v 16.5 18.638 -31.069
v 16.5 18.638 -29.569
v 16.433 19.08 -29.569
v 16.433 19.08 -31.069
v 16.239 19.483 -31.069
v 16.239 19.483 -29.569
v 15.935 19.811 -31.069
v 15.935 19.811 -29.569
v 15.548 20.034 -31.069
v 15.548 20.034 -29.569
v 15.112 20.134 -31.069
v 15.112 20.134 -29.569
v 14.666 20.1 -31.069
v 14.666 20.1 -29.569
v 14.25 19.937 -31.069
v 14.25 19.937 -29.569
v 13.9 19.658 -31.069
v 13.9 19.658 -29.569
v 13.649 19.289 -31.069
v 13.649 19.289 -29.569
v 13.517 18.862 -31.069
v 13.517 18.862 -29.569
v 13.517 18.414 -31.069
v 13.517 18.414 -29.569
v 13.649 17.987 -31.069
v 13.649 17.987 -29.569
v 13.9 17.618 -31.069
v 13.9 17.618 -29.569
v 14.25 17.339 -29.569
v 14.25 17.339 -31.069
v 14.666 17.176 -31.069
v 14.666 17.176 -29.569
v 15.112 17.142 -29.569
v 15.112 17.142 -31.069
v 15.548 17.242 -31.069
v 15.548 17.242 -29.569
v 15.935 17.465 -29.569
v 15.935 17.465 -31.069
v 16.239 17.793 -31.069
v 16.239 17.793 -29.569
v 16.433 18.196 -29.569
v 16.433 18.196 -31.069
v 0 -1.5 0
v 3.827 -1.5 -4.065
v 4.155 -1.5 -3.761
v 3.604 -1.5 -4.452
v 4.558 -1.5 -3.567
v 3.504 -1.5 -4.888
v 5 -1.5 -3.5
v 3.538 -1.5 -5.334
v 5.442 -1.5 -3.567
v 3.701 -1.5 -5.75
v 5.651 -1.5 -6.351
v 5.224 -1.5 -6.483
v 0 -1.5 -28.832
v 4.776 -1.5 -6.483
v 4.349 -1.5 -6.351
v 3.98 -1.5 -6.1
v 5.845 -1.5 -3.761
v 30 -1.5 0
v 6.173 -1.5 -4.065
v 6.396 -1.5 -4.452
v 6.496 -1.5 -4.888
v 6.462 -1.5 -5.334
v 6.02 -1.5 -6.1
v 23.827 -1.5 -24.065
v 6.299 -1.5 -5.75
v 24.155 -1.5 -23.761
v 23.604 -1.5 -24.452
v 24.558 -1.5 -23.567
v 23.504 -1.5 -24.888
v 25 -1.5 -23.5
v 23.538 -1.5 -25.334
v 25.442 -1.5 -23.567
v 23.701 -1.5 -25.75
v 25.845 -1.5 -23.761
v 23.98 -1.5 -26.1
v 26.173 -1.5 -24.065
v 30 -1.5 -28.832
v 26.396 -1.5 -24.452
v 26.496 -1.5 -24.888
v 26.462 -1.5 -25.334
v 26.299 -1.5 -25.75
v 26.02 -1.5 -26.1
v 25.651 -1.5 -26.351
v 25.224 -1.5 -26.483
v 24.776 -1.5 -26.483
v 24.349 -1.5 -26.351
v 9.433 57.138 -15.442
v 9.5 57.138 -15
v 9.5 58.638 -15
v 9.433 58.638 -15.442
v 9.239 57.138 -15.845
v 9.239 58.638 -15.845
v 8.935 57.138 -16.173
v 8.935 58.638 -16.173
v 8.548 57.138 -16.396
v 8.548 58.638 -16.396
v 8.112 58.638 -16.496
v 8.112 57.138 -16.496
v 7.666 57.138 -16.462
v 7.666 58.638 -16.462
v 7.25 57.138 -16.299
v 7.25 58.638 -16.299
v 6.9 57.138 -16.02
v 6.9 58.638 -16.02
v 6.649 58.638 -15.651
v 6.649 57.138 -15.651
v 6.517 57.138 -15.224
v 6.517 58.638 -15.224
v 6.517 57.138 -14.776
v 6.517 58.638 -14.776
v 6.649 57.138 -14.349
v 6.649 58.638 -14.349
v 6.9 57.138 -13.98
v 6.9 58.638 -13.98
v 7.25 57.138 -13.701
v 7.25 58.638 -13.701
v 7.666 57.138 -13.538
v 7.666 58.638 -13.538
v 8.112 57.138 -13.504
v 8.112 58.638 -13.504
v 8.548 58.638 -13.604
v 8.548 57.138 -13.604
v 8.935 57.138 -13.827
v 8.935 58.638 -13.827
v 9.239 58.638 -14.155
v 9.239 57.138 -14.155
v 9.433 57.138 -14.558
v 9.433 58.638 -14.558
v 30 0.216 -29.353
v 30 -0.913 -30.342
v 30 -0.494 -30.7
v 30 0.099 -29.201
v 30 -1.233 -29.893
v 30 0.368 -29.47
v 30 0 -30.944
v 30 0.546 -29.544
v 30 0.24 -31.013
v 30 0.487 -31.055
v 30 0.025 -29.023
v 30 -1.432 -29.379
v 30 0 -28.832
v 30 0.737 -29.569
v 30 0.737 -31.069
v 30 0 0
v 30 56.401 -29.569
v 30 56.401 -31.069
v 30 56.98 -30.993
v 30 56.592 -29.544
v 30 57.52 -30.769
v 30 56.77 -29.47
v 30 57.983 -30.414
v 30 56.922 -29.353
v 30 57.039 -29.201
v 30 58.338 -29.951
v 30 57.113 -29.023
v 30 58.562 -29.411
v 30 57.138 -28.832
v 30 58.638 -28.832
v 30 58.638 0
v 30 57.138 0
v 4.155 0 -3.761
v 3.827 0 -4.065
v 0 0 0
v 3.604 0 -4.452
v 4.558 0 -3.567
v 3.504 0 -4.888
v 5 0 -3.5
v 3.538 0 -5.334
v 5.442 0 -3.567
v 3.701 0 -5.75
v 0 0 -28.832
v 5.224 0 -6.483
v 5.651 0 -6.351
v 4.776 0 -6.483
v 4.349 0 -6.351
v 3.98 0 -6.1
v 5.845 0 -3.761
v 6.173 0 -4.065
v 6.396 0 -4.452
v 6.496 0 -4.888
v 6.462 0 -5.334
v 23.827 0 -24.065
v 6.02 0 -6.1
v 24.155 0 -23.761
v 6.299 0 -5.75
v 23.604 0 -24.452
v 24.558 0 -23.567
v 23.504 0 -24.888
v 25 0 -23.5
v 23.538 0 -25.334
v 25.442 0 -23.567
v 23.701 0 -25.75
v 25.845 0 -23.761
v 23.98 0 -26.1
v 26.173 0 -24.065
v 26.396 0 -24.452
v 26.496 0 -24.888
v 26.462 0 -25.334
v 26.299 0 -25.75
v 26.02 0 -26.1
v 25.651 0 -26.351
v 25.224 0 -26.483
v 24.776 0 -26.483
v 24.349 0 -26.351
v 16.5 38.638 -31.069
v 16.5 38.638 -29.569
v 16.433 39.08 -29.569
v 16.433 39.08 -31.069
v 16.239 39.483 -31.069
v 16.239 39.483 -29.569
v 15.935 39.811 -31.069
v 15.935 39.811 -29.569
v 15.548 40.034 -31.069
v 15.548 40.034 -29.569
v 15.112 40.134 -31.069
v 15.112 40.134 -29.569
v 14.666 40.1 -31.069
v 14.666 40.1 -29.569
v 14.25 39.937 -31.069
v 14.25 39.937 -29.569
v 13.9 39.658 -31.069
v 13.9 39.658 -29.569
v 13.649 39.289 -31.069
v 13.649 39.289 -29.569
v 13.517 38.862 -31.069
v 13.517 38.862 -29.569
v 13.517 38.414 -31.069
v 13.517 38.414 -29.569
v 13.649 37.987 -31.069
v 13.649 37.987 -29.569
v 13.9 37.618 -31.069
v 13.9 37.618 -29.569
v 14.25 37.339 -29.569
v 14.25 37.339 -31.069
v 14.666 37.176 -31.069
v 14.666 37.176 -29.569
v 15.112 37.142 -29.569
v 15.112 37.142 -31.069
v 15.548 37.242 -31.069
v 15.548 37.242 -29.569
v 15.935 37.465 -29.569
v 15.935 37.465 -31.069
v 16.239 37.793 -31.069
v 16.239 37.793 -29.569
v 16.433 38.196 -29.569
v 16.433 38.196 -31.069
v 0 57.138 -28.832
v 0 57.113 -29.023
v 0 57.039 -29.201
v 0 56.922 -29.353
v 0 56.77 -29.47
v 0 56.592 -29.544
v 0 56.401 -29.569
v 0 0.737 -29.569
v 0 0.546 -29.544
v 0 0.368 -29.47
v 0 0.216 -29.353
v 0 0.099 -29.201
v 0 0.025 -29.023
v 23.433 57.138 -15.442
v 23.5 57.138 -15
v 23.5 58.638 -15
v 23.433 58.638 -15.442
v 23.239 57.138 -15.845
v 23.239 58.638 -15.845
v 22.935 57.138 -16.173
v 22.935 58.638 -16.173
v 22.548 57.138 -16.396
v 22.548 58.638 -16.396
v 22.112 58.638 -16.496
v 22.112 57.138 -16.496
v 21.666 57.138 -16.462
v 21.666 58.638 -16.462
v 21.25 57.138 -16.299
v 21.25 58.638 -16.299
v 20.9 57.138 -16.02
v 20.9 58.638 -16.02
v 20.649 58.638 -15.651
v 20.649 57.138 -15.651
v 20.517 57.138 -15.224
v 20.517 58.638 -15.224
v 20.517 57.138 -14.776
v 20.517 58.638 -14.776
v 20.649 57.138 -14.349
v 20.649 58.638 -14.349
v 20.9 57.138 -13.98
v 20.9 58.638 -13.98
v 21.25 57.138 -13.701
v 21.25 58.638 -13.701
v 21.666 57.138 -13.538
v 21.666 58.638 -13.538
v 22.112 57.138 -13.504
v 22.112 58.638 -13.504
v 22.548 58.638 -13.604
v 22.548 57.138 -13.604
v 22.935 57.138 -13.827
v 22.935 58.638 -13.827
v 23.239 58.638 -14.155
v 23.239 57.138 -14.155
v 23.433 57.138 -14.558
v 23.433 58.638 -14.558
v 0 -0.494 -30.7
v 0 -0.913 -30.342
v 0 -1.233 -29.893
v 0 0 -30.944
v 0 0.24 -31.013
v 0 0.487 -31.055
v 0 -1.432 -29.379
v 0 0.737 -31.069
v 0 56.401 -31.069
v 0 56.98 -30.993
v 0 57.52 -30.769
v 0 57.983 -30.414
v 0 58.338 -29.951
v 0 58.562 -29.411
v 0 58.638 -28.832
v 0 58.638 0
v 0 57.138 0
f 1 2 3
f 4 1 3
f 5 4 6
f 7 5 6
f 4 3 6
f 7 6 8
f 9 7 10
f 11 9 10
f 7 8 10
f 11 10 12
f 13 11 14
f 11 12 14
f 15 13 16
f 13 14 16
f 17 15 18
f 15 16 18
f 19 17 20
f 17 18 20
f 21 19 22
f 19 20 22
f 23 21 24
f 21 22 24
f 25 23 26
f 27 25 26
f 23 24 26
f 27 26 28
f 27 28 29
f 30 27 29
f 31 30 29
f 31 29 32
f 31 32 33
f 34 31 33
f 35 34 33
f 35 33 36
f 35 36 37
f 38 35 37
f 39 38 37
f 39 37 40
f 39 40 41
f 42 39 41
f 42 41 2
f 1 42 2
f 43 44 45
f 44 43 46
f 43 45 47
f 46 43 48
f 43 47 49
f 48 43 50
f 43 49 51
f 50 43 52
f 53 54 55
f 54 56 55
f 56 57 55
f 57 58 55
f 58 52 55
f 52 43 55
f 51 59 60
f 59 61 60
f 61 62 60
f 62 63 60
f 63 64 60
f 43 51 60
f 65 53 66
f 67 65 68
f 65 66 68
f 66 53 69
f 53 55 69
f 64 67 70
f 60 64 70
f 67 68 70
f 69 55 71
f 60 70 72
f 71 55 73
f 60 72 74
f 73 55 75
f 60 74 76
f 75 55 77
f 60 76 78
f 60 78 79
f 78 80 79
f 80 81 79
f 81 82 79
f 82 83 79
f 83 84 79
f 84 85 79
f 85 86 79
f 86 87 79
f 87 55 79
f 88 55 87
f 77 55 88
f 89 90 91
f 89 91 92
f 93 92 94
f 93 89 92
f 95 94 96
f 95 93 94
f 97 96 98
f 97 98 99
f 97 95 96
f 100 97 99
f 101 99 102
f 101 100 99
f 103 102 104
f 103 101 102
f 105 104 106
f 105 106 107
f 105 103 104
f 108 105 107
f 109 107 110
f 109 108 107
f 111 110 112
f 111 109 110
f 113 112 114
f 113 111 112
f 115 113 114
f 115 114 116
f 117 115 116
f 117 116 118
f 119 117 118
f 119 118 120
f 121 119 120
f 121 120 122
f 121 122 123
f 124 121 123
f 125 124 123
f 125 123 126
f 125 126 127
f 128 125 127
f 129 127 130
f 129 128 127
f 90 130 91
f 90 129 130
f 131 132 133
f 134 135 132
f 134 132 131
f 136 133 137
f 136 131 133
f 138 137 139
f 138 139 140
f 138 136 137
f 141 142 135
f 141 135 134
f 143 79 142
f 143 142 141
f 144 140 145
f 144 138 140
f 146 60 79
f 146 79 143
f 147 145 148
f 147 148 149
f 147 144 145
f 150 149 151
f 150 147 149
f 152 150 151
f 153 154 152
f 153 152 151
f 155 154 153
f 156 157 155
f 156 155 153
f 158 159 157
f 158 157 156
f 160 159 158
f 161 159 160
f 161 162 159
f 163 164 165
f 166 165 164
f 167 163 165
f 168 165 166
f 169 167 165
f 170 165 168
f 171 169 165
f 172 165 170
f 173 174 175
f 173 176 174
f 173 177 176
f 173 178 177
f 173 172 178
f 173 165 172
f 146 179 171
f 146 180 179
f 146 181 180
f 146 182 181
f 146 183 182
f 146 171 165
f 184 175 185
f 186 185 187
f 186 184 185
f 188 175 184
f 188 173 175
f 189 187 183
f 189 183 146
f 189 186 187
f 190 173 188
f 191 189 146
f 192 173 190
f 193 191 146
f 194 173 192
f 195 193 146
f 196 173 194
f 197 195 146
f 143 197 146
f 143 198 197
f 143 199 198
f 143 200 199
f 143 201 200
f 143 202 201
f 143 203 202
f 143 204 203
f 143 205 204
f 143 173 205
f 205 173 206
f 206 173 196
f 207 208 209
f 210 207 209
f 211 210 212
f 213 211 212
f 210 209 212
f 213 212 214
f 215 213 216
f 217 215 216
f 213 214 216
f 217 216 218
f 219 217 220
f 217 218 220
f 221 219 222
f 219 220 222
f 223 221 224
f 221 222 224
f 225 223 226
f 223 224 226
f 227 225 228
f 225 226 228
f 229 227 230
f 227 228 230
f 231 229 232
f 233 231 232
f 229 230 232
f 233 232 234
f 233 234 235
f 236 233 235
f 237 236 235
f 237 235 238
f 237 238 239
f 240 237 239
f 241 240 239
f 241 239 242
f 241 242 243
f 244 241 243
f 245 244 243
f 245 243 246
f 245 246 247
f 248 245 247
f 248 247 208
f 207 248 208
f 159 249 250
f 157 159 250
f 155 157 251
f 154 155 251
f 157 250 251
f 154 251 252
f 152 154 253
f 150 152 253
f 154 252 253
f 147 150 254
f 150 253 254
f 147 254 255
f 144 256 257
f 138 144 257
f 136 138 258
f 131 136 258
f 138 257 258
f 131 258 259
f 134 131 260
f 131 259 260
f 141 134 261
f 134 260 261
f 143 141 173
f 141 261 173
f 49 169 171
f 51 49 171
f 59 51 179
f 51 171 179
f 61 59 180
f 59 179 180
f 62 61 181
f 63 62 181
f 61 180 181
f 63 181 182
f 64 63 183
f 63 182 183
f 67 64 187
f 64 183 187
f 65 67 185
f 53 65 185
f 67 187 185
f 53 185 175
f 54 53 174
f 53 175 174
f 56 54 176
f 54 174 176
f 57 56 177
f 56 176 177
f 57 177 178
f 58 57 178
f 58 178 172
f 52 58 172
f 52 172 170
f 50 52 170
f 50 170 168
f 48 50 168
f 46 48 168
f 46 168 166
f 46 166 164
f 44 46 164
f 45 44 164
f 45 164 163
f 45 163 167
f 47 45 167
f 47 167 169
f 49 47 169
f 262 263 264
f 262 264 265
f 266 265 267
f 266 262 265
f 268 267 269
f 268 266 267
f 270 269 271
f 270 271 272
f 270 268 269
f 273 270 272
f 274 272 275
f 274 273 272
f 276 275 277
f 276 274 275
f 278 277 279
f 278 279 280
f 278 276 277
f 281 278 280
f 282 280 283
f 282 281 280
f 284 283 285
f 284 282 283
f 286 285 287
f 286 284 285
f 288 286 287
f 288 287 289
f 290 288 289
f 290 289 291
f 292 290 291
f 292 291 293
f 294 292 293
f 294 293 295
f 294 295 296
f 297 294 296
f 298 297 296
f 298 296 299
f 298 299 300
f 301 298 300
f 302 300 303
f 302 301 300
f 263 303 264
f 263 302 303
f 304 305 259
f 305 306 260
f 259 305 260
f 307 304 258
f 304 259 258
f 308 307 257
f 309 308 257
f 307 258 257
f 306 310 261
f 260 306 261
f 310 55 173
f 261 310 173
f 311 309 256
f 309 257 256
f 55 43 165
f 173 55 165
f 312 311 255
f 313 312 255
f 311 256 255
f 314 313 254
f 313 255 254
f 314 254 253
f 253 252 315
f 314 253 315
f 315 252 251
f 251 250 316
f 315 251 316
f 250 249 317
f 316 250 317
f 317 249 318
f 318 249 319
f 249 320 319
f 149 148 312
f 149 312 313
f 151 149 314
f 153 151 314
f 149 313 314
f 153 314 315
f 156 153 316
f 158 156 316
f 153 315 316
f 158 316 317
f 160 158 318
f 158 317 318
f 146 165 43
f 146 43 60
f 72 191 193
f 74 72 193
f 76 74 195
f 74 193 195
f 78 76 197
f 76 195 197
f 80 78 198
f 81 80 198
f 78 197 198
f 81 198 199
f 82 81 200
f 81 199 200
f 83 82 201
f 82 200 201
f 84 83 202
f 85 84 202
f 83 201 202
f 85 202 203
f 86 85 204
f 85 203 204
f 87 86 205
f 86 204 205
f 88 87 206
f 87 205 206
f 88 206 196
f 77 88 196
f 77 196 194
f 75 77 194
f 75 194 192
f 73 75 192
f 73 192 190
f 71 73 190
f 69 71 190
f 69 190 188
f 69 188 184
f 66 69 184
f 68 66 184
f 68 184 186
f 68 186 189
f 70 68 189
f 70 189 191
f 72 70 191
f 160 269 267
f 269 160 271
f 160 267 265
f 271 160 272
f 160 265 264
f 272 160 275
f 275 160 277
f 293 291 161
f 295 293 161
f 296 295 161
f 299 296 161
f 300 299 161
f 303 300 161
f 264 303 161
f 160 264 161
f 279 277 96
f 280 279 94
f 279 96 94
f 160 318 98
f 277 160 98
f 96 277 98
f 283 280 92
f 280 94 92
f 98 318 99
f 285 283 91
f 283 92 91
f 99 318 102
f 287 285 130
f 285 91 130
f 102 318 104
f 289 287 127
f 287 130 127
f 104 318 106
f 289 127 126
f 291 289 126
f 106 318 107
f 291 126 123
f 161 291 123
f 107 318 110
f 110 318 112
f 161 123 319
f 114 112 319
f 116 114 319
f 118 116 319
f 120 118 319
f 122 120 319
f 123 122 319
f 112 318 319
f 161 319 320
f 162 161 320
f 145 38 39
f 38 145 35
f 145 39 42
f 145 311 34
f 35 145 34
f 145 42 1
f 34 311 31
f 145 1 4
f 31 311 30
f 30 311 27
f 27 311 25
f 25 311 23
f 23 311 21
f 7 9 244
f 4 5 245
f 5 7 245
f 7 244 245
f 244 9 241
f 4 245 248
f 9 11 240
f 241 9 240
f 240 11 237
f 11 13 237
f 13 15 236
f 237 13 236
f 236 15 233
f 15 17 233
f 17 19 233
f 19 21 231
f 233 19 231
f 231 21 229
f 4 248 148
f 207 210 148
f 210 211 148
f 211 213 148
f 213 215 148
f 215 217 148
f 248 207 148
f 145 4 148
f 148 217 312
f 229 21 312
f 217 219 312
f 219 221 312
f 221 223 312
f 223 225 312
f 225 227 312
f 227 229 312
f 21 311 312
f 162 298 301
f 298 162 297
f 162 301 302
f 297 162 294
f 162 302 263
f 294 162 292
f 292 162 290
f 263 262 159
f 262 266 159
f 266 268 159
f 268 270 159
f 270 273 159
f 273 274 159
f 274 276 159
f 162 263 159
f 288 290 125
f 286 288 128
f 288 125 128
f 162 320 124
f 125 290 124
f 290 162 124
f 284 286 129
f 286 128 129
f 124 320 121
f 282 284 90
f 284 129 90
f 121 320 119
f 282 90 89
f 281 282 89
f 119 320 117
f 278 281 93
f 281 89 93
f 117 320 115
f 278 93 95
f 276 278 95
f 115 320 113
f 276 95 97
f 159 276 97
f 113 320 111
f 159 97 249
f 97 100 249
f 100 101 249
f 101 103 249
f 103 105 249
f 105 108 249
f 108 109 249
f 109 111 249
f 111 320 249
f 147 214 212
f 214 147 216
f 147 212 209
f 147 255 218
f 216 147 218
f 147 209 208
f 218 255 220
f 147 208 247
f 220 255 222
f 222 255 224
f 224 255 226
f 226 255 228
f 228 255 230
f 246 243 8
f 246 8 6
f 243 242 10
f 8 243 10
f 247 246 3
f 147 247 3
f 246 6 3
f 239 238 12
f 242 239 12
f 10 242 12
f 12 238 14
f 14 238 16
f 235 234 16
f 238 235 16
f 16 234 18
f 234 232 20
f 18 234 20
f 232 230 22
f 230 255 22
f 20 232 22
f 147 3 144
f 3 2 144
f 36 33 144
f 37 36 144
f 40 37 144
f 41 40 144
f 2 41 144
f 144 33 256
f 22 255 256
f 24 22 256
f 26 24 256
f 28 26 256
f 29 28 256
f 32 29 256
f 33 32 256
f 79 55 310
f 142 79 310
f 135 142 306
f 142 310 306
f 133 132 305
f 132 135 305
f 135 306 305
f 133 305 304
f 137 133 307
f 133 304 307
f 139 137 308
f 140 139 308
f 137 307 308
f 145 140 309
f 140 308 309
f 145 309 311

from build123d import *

# Parameters (mm, degrees)
SKETCH1_W                       = 30
SKETCH1_H                       = 118
SKETCH1_R                       = 1.5
BASE_FLANGE1_DEPTH              = 1.5
SKETCHED_BEND1_DEPTH            = 30
SKETCHED_START                  = 9.5000001
SKETCHED_BEND1_2_DEPTH          = 10.9999998
SKETCHED_BEND1_3_DEPTH          = 6.4999999
SKETCHED_START_2                = 23.5000001
SKETCHED_BEND1_4_DEPTH          = 6.4999999
SKETCHED_START_3                = 6.4999999
SKETCHED_BEND1_5_DEPTH          = 17.0000002
SKETCHED_START_4                = 57.138054181
SKETCHED_BEND1_6_OUTLINE_R      = 1.5
SKETCHED_BEND1_6_DEPTH          = 1.5
F_3_0MM_PRESS_DOWEL_HOLE1_D     = 3
F_3_0MM_PRESS_DOWEL_HOLE1_DEPTH = 6
F_3_0MM_PRESS_DOWEL_HOLE1_TIP   = 0.901290929
F_3_0MM_PRESS_DOWEL_HOLE2_D     = 3


with BuildPart() as part:
    # Base-Flange1: sheet metal written as solids
    # Sketch1 → Base-Flange1 (new body)
    with BuildSketch(Plane(origin=(0, 0, 0), x_dir=(1, 0, 0), z_dir=(0, 1, 0))):
        with Locations((15, 59)):
            Rectangle(SKETCH1_W, SKETCH1_H)
        with Locations(Location((8, 103, 0), (0, 0, 270))):
            Circle(SKETCH1_R, mode=Mode.SUBTRACT)
        with Locations(Location((22, 103, 0), (0, 0, 270))):
            Circle(SKETCH1_R, mode=Mode.SUBTRACT)
        with Locations(Location((25, 25, 0), (0, 0, 270))):
            Circle(SKETCH1_R, mode=Mode.SUBTRACT)
        with Locations(Location((5, 5, 0), (0, 0, 270))):
            Circle(SKETCH1_R, mode=Mode.SUBTRACT)
    extrude(amount=-BASE_FLANGE1_DEPTH)

    # Sketched Bend1: read off the stored shape, not the designer's step
    # Sketched Bend1 outline → Sketched Bend1 (cut)
    with BuildSketch(Plane.YZ):
        with BuildLine():
            Line((0, -118), (0, -30.944250946))
            ThreePointArc((0, -30.944250946), (-1.086838938, -30.127591172), (-1.5, -28.83242709))
            Line((-1.5, -28.83242709), (-1.5, -118))
            Line((-1.5, -118), (0, -118))
        make_face()
    extrude(amount=SKETCHED_BEND1_DEPTH, mode=Mode.SUBTRACT)

    # Sketched Bend1 2 outline → Sketched Bend1 2 (add)
    with BuildSketch(Plane.YZ.offset(SKETCHED_START)):
        with BuildLine():
            Line((56.401454181, -29.56902709), (0.7366, -29.56902709))
            ThreePointArc((0.7366, -29.56902709), (0.215745145, -29.353281945), (0, -28.83242709))
            Line((0, -28.83242709), (0, -30.944250946))
            ThreePointArc((0, -30.944250946), (0.363053267, -31.037612433), (0.7366, -31.06902709))
            Line((0.7366, -31.06902709), (56.401454181, -31.06902709))
            ThreePointArc((56.401454181, -31.06902709), (57.982969207, -30.413942116), (58.638054181, -28.83242709))
            Line((58.638054181, -28.83242709), (58.638054181, 0))
            Line((58.638054181, 0), (57.138054181, 0))
            Line((57.138054181, 0), (57.138054181, -28.83242709))
            ThreePointArc((57.138054181, -28.83242709), (56.922309036, -29.353281945), (56.401454181, -29.56902709))
        make_face()
    extrude(amount=SKETCHED_BEND1_2_DEPTH)

    # Sketched Bend1 3 outline → Sketched Bend1 3 (add)
    with BuildSketch(Plane.YZ):
        with BuildLine():
            Line((56.401454181, -29.56902709), (0.7366, -29.56902709))
            ThreePointArc((0.7366, -29.56902709), (0.215745145, -29.353281945), (0, -28.83242709))
            Line((0, -28.83242709), (0, -30.944250946))
            ThreePointArc((0, -30.944250946), (0.363053267, -31.037612433), (0.7366, -31.06902709))
            Line((0.7366, -31.06902709), (56.401454181, -31.06902709))
            ThreePointArc((56.401454181, -31.06902709), (57.982969207, -30.413942116), (58.638054181, -28.83242709))
            Line((58.638054181, -28.83242709), (58.638054181, 0))
            Line((58.638054181, 0), (57.138054181, 0))
            Line((57.138054181, 0), (57.138054181, -28.83242709))
            ThreePointArc((57.138054181, -28.83242709), (56.922309036, -29.353281945), (56.401454181, -29.56902709))
        make_face()
    extrude(amount=SKETCHED_BEND1_3_DEPTH)

    # Sketched Bend1 4 outline → Sketched Bend1 4 (add)
    with BuildSketch(Plane.YZ.offset(SKETCHED_START_2)):
        with BuildLine():
            Line((56.401454181, -29.56902709), (0.7366, -29.56902709))
            ThreePointArc((0.7366, -29.56902709), (0.215745145, -29.353281945), (0, -28.83242709))
            Line((0, -28.83242709), (0, -30.944250946))
            ThreePointArc((0, -30.944250946), (0.363053267, -31.037612433), (0.7366, -31.06902709))
            Line((0.7366, -31.06902709), (56.401454181, -31.06902709))
            ThreePointArc((56.401454181, -31.06902709), (57.982969207, -30.413942116), (58.638054181, -28.83242709))
            Line((58.638054181, -28.83242709), (58.638054181, 0))
            Line((58.638054181, 0), (57.138054181, 0))
            Line((57.138054181, 0), (57.138054181, -28.83242709))
            ThreePointArc((57.138054181, -28.83242709), (56.922309036, -29.353281945), (56.401454181, -29.56902709))
        make_face()
    extrude(amount=SKETCHED_BEND1_4_DEPTH)

    # Sketched Bend1 5 outline → Sketched Bend1 5 (add)
    with BuildSketch(Plane.YZ.offset(SKETCHED_START_3)):
        with BuildLine():
            Line((56.401454181, -29.56902709), (0.7366, -29.56902709))
            ThreePointArc((0.7366, -29.56902709), (0.215745145, -29.353281945), (0, -28.83242709))
            Line((0, -28.83242709), (0, -30.944250946))
            ThreePointArc((0, -30.944250946), (0.363053267, -31.037612433), (0.7366, -31.06902709))
            Line((0.7366, -31.06902709), (56.401454181, -31.06902709))
            ThreePointArc((56.401454181, -31.06902709), (57.982969207, -30.413942116), (58.638054181, -28.83242709))
            Line((58.638054181, -28.83242709), (58.638054181, 0))
            Line((58.638054181, 0), (57.138054181, 0))
            Line((57.138054181, 0), (57.138054181, -28.83242709))
            ThreePointArc((57.138054181, -28.83242709), (56.922309036, -29.353281945), (56.401454181, -29.56902709))
        make_face()
    extrude(amount=SKETCHED_BEND1_5_DEPTH)

    # Sketched Bend1 6 outline → Sketched Bend1 6 (cut)
    with BuildSketch(Plane(origin=(0, 0, 0), x_dir=(1, 0, 0), z_dir=(0, 1, 0)).offset(SKETCHED_START_4)):
        with Locations((8, 15)):
            Circle(SKETCHED_BEND1_6_OUTLINE_R)
        with Locations((22, 15)):
            Circle(SKETCHED_BEND1_6_OUTLINE_R)
    extrude(amount=SKETCHED_BEND1_6_DEPTH, mode=Mode.SUBTRACT)

    # Ø3.0mm Press Dowel Hole1
    with Locations(Plane(origin=(-227.525513363, -7.5, -157.600386311), x_dir=(1, 0, 0), z_dir=(0, -1, 0))):
        with Locations((220.525513363, 156.531359221), (102.525513363, 181.531359221), (102.525513363, 271.531359221), (89.19270005, 226.531359221), (210.525513363, 317.793651488), (230.525513363, 317.793651488), (252.525513363, 320.462332131), (232.525513363, 300.462332131), (252.525513363, 132.600386311), (232.525513363, 152.600386311), (111.286271896, 136.531359221), (91.286271896, 136.531359221), (41.525513363, 196.432813402), (13.525513363, 196.432813402), (41.525513363, 138.767959221), (13.525513363, 138.767959221), (41.525513363, 256.62990504), (13.525513363, 256.62990504), (41.525513363, 314.294759221), (13.525513363, 314.294759221)):
            Hole(F_3_0MM_PRESS_DOWEL_HOLE1_D / 2, depth=F_3_0MM_PRESS_DOWEL_HOLE1_DEPTH)
            with Locations((0, 0, -(F_3_0MM_PRESS_DOWEL_HOLE1_DEPTH + F_3_0MM_PRESS_DOWEL_HOLE1_TIP / 2))):  # 118° drill point
                Cone(0, F_3_0MM_PRESS_DOWEL_HOLE1_D / 2, F_3_0MM_PRESS_DOWEL_HOLE1_TIP, mode=Mode.SUBTRACT)

    # Ø3.0mm Press Dowel Hole2 (through all)
    with Locations(Plane(origin=(0, 0, -31.06902709), x_dir=(-1, 0, 0), z_dir=(0, 0, -1))):
        with Locations((-15, 38.638054181), (-15, 18.638054181)):
            Hole(F_3_0MM_PRESS_DOWEL_HOLE2_D / 2)


solid = part.part
